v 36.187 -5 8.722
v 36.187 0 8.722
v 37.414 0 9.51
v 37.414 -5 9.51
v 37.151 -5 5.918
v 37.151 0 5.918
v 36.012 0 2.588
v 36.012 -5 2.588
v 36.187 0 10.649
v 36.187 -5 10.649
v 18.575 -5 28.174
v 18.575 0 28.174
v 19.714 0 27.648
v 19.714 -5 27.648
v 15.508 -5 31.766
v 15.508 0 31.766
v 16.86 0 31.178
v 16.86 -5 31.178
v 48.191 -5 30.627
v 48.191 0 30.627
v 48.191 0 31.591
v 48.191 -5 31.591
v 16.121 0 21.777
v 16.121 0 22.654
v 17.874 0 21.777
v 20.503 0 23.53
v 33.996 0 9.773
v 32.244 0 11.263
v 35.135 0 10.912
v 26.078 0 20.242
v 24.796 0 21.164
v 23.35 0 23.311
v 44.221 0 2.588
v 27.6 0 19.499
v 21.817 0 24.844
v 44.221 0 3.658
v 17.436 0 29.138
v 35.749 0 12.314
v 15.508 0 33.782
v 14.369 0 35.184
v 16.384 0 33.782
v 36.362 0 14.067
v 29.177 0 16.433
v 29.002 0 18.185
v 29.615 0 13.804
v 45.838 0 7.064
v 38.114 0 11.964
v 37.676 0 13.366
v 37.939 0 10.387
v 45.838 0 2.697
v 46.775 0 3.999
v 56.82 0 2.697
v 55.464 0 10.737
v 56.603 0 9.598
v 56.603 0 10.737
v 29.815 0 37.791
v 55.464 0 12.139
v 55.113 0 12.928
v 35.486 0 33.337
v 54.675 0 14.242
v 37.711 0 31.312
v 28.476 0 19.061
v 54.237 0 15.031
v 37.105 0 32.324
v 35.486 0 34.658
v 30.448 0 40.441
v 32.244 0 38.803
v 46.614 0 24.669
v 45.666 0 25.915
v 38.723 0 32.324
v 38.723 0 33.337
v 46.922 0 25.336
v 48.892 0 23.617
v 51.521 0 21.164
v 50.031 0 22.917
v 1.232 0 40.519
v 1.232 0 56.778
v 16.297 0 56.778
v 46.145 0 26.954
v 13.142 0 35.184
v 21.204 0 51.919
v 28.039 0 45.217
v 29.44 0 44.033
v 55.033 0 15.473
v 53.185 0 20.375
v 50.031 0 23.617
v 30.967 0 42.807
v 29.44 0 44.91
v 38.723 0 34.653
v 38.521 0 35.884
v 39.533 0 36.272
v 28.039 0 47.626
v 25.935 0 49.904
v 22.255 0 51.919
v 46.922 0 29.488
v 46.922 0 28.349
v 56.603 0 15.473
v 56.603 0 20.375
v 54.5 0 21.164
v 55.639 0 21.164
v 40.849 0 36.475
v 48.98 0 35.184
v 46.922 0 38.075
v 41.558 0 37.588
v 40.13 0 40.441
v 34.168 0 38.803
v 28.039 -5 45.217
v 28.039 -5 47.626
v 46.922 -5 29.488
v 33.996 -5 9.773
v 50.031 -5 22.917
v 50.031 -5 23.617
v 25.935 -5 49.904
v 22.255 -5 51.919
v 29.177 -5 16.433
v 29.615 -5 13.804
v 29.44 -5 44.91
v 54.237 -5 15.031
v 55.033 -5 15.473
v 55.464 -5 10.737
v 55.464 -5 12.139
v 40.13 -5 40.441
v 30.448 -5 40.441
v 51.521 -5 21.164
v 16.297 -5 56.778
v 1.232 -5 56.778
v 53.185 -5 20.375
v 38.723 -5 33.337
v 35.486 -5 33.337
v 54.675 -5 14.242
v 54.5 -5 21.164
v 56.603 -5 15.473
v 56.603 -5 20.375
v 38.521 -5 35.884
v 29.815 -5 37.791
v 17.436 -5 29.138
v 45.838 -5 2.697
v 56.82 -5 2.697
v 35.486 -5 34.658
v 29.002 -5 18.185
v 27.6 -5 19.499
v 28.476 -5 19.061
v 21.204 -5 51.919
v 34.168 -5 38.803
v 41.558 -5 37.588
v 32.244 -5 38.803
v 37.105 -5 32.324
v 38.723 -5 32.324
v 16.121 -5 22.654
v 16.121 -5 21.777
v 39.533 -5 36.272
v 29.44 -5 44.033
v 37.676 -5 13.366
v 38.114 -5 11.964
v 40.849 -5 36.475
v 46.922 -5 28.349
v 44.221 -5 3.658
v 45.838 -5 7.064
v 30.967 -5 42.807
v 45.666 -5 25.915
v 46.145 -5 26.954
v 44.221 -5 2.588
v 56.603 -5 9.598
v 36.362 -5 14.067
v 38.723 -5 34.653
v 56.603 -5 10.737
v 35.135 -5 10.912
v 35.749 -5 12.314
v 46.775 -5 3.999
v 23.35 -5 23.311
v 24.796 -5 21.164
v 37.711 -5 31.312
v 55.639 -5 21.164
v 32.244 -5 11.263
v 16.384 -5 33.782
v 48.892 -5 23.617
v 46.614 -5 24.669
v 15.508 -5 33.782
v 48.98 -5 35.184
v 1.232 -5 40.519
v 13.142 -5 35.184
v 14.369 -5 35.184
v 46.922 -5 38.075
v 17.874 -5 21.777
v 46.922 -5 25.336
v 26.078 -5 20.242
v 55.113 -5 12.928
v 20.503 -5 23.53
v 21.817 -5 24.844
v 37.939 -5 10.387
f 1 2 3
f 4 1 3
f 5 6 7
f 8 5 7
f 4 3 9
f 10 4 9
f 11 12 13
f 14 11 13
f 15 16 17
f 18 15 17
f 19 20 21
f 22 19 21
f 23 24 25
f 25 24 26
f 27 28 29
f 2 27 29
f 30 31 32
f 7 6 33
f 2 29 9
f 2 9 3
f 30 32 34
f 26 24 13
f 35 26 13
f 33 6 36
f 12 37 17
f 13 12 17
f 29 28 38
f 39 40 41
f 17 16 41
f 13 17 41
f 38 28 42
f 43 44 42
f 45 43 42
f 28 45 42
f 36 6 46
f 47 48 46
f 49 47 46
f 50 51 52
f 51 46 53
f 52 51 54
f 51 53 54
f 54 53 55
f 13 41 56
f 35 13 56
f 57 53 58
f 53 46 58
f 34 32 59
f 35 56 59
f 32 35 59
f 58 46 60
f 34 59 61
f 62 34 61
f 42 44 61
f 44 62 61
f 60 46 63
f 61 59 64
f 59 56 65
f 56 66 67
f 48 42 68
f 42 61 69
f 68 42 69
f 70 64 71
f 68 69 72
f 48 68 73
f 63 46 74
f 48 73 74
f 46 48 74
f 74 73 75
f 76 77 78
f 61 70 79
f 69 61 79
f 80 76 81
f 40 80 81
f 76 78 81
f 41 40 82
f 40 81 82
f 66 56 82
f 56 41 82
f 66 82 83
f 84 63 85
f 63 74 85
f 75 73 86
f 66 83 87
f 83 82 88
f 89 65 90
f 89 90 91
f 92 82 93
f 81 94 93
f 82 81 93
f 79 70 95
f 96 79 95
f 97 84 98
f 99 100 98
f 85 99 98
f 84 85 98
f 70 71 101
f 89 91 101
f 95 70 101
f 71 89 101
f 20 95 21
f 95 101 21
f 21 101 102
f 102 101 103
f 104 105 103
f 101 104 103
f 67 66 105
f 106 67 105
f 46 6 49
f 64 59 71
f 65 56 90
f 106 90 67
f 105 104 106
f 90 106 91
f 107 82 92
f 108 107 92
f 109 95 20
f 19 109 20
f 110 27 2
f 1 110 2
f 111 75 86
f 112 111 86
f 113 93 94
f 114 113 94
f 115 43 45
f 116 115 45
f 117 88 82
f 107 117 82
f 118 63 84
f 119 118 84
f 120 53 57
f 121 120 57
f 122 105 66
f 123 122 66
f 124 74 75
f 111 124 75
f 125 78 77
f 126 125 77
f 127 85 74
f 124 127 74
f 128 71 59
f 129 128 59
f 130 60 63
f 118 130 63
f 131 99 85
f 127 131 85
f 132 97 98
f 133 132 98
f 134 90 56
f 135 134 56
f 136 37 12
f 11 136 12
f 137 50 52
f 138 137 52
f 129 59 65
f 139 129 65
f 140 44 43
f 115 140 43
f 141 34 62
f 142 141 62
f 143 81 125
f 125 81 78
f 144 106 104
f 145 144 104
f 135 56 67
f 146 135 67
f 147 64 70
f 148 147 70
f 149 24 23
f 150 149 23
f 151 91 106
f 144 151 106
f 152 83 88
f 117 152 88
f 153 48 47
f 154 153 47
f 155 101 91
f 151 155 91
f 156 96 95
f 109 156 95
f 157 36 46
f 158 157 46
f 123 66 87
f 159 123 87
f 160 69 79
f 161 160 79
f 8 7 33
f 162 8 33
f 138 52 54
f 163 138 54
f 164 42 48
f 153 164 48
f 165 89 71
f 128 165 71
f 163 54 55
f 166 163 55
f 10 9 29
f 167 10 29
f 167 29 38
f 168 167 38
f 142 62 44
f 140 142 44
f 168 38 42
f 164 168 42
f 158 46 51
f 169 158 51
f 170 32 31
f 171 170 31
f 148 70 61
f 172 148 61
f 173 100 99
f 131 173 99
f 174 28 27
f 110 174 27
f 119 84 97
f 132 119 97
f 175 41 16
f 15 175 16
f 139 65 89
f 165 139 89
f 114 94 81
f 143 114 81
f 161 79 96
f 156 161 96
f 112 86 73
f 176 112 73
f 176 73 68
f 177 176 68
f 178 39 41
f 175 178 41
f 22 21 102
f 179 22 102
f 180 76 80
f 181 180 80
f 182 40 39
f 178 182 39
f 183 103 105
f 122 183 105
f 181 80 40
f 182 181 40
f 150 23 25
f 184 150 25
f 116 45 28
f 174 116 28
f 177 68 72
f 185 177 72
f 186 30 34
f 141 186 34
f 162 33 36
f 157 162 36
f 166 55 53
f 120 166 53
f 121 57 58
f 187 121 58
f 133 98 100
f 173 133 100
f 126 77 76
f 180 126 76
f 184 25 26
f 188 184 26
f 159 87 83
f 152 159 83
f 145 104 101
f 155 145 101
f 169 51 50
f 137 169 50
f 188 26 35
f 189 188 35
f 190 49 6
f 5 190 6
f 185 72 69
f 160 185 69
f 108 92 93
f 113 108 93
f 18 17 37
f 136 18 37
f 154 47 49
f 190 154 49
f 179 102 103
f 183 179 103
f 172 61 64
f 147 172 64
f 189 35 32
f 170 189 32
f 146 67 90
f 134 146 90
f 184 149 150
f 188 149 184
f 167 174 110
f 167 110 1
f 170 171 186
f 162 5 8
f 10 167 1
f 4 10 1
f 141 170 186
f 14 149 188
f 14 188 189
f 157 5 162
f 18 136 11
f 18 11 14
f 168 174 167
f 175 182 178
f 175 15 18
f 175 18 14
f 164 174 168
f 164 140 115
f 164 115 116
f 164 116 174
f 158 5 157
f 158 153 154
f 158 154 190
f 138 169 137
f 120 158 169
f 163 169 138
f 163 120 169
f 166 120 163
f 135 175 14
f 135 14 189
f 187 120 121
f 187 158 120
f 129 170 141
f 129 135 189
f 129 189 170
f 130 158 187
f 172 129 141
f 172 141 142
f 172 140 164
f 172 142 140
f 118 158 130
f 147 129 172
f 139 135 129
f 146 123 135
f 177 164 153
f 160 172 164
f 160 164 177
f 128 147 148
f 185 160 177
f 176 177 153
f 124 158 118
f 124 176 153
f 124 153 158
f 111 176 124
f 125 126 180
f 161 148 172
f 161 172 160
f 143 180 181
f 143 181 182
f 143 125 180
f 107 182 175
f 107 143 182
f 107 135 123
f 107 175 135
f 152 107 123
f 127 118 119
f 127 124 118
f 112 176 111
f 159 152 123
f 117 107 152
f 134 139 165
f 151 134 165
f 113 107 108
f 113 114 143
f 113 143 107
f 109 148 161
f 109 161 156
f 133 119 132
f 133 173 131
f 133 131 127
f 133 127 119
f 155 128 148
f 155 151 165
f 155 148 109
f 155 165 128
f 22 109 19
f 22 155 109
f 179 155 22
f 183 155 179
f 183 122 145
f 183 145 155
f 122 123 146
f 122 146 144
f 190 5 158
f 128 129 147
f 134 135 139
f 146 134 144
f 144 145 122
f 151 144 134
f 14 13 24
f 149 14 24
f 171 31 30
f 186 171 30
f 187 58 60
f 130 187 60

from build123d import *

# Parameters (mm, degrees)
F1_DEPTH = 5


with BuildPart() as f1:
    # F0 (on Front) → F1 (new body)
    with BuildSketch(Plane.XZ):
        Polygon((56.602631, 9.598027), (56.602631, 10.737107), (55.463549, 10.737107), (55.463549, 12.139052), (55.113062, 12.927647), (54.674953, 14.24197), (54.236848, 15.030565), (55.032882, 15.472803), (55.726416, 15.472803), (56.602631, 15.472803), (56.602631, 20.375481), (55.63879, 21.164075), (54.499712, 21.164075), (53.185388, 20.375481), (51.520579, 21.164075), (50.03101, 22.916507), (50.03101, 23.617478), (48.891932, 23.617478), (46.613768, 24.668938), (46.921512, 25.335718), (45.665746, 25.915302), (46.145314, 26.954366), (46.921512, 28.349044), (46.921512, 29.488124), (48.190959, 30.627204), (48.190959, 31.591043), (48.979554, 35.183527), (46.921512, 38.075037), (40.129773, 40.44082), (31.455237, 40.44082), (30.447589, 40.44082), (30.96698, 42.806929), (29.439941, 44.033308), (29.439941, 44.909522), (28.039239, 45.216994), (28.039239, 47.625791), (25.935078, 49.903952), (22.254972, 51.919248), (21.203512, 51.919248), (16.296705, 56.777831), (1.23168, 56.777831), (1.23168, 40.518545), (13.142328, 35.183527), (14.36903, 35.183527), (15.508111, 33.781581), (16.384326, 33.781581), (15.508111, 31.766284), (16.860185, 31.178426), (17.435785, 29.137637), (18.574866, 28.173801), (19.713946, 27.648071), (16.121462, 22.653641), (16.121462, 21.777425), (17.873893, 21.777425), (20.502539, 23.529857), (21.816865, 24.844181), (23.350241, 23.310802), (24.795998, 21.164075), (26.07753, 20.242271), (27.599888, 19.499265), (28.476104, 19.061157), (29.001834, 18.184941), (29.177075, 16.432509), (29.615184, 13.803862), (32.243829, 11.262836), (33.996262, 9.77327), (36.186803, 8.72181), (37.413504, 9.510404), (36.186803, 10.649486), (35.135344, 10.91235), (35.748694, 12.314295), (36.362045, 14.066727), (37.676368, 13.365754), (38.114477, 11.963809), (37.939236, 10.386621), (37.15064, 5.91792), (36.011558, 2.588299), (44.220895, 2.588299), (44.220895, 3.658485), (45.838311, 7.063572), (46.774711, 3.998994), (45.838311, 2.697169), (56.819715, 2.697169), align=None)
        Polygon((38.723323, 32.324277), (37.710983, 31.31194), (37.104577, 32.324277), align=None, mode=Mode.SUBTRACT)
        Polygon((35.48583, 34.657795), (38.723323, 34.652654), (38.723323, 33.336617), (35.48583, 33.336617), align=None, mode=Mode.SUBTRACT)
        Polygon((29.814744, 37.790902), (32.243829, 38.803242), (38.520854, 35.8845), align=None, mode=Mode.SUBTRACT)
        Polygon((41.557871, 37.588436), (40.849231, 36.474865), (39.53319, 36.272395), (34.1678, 38.803242), align=None, mode=Mode.SUBTRACT)
    extrude(amount=F1_DEPTH)


solid = f1.part
